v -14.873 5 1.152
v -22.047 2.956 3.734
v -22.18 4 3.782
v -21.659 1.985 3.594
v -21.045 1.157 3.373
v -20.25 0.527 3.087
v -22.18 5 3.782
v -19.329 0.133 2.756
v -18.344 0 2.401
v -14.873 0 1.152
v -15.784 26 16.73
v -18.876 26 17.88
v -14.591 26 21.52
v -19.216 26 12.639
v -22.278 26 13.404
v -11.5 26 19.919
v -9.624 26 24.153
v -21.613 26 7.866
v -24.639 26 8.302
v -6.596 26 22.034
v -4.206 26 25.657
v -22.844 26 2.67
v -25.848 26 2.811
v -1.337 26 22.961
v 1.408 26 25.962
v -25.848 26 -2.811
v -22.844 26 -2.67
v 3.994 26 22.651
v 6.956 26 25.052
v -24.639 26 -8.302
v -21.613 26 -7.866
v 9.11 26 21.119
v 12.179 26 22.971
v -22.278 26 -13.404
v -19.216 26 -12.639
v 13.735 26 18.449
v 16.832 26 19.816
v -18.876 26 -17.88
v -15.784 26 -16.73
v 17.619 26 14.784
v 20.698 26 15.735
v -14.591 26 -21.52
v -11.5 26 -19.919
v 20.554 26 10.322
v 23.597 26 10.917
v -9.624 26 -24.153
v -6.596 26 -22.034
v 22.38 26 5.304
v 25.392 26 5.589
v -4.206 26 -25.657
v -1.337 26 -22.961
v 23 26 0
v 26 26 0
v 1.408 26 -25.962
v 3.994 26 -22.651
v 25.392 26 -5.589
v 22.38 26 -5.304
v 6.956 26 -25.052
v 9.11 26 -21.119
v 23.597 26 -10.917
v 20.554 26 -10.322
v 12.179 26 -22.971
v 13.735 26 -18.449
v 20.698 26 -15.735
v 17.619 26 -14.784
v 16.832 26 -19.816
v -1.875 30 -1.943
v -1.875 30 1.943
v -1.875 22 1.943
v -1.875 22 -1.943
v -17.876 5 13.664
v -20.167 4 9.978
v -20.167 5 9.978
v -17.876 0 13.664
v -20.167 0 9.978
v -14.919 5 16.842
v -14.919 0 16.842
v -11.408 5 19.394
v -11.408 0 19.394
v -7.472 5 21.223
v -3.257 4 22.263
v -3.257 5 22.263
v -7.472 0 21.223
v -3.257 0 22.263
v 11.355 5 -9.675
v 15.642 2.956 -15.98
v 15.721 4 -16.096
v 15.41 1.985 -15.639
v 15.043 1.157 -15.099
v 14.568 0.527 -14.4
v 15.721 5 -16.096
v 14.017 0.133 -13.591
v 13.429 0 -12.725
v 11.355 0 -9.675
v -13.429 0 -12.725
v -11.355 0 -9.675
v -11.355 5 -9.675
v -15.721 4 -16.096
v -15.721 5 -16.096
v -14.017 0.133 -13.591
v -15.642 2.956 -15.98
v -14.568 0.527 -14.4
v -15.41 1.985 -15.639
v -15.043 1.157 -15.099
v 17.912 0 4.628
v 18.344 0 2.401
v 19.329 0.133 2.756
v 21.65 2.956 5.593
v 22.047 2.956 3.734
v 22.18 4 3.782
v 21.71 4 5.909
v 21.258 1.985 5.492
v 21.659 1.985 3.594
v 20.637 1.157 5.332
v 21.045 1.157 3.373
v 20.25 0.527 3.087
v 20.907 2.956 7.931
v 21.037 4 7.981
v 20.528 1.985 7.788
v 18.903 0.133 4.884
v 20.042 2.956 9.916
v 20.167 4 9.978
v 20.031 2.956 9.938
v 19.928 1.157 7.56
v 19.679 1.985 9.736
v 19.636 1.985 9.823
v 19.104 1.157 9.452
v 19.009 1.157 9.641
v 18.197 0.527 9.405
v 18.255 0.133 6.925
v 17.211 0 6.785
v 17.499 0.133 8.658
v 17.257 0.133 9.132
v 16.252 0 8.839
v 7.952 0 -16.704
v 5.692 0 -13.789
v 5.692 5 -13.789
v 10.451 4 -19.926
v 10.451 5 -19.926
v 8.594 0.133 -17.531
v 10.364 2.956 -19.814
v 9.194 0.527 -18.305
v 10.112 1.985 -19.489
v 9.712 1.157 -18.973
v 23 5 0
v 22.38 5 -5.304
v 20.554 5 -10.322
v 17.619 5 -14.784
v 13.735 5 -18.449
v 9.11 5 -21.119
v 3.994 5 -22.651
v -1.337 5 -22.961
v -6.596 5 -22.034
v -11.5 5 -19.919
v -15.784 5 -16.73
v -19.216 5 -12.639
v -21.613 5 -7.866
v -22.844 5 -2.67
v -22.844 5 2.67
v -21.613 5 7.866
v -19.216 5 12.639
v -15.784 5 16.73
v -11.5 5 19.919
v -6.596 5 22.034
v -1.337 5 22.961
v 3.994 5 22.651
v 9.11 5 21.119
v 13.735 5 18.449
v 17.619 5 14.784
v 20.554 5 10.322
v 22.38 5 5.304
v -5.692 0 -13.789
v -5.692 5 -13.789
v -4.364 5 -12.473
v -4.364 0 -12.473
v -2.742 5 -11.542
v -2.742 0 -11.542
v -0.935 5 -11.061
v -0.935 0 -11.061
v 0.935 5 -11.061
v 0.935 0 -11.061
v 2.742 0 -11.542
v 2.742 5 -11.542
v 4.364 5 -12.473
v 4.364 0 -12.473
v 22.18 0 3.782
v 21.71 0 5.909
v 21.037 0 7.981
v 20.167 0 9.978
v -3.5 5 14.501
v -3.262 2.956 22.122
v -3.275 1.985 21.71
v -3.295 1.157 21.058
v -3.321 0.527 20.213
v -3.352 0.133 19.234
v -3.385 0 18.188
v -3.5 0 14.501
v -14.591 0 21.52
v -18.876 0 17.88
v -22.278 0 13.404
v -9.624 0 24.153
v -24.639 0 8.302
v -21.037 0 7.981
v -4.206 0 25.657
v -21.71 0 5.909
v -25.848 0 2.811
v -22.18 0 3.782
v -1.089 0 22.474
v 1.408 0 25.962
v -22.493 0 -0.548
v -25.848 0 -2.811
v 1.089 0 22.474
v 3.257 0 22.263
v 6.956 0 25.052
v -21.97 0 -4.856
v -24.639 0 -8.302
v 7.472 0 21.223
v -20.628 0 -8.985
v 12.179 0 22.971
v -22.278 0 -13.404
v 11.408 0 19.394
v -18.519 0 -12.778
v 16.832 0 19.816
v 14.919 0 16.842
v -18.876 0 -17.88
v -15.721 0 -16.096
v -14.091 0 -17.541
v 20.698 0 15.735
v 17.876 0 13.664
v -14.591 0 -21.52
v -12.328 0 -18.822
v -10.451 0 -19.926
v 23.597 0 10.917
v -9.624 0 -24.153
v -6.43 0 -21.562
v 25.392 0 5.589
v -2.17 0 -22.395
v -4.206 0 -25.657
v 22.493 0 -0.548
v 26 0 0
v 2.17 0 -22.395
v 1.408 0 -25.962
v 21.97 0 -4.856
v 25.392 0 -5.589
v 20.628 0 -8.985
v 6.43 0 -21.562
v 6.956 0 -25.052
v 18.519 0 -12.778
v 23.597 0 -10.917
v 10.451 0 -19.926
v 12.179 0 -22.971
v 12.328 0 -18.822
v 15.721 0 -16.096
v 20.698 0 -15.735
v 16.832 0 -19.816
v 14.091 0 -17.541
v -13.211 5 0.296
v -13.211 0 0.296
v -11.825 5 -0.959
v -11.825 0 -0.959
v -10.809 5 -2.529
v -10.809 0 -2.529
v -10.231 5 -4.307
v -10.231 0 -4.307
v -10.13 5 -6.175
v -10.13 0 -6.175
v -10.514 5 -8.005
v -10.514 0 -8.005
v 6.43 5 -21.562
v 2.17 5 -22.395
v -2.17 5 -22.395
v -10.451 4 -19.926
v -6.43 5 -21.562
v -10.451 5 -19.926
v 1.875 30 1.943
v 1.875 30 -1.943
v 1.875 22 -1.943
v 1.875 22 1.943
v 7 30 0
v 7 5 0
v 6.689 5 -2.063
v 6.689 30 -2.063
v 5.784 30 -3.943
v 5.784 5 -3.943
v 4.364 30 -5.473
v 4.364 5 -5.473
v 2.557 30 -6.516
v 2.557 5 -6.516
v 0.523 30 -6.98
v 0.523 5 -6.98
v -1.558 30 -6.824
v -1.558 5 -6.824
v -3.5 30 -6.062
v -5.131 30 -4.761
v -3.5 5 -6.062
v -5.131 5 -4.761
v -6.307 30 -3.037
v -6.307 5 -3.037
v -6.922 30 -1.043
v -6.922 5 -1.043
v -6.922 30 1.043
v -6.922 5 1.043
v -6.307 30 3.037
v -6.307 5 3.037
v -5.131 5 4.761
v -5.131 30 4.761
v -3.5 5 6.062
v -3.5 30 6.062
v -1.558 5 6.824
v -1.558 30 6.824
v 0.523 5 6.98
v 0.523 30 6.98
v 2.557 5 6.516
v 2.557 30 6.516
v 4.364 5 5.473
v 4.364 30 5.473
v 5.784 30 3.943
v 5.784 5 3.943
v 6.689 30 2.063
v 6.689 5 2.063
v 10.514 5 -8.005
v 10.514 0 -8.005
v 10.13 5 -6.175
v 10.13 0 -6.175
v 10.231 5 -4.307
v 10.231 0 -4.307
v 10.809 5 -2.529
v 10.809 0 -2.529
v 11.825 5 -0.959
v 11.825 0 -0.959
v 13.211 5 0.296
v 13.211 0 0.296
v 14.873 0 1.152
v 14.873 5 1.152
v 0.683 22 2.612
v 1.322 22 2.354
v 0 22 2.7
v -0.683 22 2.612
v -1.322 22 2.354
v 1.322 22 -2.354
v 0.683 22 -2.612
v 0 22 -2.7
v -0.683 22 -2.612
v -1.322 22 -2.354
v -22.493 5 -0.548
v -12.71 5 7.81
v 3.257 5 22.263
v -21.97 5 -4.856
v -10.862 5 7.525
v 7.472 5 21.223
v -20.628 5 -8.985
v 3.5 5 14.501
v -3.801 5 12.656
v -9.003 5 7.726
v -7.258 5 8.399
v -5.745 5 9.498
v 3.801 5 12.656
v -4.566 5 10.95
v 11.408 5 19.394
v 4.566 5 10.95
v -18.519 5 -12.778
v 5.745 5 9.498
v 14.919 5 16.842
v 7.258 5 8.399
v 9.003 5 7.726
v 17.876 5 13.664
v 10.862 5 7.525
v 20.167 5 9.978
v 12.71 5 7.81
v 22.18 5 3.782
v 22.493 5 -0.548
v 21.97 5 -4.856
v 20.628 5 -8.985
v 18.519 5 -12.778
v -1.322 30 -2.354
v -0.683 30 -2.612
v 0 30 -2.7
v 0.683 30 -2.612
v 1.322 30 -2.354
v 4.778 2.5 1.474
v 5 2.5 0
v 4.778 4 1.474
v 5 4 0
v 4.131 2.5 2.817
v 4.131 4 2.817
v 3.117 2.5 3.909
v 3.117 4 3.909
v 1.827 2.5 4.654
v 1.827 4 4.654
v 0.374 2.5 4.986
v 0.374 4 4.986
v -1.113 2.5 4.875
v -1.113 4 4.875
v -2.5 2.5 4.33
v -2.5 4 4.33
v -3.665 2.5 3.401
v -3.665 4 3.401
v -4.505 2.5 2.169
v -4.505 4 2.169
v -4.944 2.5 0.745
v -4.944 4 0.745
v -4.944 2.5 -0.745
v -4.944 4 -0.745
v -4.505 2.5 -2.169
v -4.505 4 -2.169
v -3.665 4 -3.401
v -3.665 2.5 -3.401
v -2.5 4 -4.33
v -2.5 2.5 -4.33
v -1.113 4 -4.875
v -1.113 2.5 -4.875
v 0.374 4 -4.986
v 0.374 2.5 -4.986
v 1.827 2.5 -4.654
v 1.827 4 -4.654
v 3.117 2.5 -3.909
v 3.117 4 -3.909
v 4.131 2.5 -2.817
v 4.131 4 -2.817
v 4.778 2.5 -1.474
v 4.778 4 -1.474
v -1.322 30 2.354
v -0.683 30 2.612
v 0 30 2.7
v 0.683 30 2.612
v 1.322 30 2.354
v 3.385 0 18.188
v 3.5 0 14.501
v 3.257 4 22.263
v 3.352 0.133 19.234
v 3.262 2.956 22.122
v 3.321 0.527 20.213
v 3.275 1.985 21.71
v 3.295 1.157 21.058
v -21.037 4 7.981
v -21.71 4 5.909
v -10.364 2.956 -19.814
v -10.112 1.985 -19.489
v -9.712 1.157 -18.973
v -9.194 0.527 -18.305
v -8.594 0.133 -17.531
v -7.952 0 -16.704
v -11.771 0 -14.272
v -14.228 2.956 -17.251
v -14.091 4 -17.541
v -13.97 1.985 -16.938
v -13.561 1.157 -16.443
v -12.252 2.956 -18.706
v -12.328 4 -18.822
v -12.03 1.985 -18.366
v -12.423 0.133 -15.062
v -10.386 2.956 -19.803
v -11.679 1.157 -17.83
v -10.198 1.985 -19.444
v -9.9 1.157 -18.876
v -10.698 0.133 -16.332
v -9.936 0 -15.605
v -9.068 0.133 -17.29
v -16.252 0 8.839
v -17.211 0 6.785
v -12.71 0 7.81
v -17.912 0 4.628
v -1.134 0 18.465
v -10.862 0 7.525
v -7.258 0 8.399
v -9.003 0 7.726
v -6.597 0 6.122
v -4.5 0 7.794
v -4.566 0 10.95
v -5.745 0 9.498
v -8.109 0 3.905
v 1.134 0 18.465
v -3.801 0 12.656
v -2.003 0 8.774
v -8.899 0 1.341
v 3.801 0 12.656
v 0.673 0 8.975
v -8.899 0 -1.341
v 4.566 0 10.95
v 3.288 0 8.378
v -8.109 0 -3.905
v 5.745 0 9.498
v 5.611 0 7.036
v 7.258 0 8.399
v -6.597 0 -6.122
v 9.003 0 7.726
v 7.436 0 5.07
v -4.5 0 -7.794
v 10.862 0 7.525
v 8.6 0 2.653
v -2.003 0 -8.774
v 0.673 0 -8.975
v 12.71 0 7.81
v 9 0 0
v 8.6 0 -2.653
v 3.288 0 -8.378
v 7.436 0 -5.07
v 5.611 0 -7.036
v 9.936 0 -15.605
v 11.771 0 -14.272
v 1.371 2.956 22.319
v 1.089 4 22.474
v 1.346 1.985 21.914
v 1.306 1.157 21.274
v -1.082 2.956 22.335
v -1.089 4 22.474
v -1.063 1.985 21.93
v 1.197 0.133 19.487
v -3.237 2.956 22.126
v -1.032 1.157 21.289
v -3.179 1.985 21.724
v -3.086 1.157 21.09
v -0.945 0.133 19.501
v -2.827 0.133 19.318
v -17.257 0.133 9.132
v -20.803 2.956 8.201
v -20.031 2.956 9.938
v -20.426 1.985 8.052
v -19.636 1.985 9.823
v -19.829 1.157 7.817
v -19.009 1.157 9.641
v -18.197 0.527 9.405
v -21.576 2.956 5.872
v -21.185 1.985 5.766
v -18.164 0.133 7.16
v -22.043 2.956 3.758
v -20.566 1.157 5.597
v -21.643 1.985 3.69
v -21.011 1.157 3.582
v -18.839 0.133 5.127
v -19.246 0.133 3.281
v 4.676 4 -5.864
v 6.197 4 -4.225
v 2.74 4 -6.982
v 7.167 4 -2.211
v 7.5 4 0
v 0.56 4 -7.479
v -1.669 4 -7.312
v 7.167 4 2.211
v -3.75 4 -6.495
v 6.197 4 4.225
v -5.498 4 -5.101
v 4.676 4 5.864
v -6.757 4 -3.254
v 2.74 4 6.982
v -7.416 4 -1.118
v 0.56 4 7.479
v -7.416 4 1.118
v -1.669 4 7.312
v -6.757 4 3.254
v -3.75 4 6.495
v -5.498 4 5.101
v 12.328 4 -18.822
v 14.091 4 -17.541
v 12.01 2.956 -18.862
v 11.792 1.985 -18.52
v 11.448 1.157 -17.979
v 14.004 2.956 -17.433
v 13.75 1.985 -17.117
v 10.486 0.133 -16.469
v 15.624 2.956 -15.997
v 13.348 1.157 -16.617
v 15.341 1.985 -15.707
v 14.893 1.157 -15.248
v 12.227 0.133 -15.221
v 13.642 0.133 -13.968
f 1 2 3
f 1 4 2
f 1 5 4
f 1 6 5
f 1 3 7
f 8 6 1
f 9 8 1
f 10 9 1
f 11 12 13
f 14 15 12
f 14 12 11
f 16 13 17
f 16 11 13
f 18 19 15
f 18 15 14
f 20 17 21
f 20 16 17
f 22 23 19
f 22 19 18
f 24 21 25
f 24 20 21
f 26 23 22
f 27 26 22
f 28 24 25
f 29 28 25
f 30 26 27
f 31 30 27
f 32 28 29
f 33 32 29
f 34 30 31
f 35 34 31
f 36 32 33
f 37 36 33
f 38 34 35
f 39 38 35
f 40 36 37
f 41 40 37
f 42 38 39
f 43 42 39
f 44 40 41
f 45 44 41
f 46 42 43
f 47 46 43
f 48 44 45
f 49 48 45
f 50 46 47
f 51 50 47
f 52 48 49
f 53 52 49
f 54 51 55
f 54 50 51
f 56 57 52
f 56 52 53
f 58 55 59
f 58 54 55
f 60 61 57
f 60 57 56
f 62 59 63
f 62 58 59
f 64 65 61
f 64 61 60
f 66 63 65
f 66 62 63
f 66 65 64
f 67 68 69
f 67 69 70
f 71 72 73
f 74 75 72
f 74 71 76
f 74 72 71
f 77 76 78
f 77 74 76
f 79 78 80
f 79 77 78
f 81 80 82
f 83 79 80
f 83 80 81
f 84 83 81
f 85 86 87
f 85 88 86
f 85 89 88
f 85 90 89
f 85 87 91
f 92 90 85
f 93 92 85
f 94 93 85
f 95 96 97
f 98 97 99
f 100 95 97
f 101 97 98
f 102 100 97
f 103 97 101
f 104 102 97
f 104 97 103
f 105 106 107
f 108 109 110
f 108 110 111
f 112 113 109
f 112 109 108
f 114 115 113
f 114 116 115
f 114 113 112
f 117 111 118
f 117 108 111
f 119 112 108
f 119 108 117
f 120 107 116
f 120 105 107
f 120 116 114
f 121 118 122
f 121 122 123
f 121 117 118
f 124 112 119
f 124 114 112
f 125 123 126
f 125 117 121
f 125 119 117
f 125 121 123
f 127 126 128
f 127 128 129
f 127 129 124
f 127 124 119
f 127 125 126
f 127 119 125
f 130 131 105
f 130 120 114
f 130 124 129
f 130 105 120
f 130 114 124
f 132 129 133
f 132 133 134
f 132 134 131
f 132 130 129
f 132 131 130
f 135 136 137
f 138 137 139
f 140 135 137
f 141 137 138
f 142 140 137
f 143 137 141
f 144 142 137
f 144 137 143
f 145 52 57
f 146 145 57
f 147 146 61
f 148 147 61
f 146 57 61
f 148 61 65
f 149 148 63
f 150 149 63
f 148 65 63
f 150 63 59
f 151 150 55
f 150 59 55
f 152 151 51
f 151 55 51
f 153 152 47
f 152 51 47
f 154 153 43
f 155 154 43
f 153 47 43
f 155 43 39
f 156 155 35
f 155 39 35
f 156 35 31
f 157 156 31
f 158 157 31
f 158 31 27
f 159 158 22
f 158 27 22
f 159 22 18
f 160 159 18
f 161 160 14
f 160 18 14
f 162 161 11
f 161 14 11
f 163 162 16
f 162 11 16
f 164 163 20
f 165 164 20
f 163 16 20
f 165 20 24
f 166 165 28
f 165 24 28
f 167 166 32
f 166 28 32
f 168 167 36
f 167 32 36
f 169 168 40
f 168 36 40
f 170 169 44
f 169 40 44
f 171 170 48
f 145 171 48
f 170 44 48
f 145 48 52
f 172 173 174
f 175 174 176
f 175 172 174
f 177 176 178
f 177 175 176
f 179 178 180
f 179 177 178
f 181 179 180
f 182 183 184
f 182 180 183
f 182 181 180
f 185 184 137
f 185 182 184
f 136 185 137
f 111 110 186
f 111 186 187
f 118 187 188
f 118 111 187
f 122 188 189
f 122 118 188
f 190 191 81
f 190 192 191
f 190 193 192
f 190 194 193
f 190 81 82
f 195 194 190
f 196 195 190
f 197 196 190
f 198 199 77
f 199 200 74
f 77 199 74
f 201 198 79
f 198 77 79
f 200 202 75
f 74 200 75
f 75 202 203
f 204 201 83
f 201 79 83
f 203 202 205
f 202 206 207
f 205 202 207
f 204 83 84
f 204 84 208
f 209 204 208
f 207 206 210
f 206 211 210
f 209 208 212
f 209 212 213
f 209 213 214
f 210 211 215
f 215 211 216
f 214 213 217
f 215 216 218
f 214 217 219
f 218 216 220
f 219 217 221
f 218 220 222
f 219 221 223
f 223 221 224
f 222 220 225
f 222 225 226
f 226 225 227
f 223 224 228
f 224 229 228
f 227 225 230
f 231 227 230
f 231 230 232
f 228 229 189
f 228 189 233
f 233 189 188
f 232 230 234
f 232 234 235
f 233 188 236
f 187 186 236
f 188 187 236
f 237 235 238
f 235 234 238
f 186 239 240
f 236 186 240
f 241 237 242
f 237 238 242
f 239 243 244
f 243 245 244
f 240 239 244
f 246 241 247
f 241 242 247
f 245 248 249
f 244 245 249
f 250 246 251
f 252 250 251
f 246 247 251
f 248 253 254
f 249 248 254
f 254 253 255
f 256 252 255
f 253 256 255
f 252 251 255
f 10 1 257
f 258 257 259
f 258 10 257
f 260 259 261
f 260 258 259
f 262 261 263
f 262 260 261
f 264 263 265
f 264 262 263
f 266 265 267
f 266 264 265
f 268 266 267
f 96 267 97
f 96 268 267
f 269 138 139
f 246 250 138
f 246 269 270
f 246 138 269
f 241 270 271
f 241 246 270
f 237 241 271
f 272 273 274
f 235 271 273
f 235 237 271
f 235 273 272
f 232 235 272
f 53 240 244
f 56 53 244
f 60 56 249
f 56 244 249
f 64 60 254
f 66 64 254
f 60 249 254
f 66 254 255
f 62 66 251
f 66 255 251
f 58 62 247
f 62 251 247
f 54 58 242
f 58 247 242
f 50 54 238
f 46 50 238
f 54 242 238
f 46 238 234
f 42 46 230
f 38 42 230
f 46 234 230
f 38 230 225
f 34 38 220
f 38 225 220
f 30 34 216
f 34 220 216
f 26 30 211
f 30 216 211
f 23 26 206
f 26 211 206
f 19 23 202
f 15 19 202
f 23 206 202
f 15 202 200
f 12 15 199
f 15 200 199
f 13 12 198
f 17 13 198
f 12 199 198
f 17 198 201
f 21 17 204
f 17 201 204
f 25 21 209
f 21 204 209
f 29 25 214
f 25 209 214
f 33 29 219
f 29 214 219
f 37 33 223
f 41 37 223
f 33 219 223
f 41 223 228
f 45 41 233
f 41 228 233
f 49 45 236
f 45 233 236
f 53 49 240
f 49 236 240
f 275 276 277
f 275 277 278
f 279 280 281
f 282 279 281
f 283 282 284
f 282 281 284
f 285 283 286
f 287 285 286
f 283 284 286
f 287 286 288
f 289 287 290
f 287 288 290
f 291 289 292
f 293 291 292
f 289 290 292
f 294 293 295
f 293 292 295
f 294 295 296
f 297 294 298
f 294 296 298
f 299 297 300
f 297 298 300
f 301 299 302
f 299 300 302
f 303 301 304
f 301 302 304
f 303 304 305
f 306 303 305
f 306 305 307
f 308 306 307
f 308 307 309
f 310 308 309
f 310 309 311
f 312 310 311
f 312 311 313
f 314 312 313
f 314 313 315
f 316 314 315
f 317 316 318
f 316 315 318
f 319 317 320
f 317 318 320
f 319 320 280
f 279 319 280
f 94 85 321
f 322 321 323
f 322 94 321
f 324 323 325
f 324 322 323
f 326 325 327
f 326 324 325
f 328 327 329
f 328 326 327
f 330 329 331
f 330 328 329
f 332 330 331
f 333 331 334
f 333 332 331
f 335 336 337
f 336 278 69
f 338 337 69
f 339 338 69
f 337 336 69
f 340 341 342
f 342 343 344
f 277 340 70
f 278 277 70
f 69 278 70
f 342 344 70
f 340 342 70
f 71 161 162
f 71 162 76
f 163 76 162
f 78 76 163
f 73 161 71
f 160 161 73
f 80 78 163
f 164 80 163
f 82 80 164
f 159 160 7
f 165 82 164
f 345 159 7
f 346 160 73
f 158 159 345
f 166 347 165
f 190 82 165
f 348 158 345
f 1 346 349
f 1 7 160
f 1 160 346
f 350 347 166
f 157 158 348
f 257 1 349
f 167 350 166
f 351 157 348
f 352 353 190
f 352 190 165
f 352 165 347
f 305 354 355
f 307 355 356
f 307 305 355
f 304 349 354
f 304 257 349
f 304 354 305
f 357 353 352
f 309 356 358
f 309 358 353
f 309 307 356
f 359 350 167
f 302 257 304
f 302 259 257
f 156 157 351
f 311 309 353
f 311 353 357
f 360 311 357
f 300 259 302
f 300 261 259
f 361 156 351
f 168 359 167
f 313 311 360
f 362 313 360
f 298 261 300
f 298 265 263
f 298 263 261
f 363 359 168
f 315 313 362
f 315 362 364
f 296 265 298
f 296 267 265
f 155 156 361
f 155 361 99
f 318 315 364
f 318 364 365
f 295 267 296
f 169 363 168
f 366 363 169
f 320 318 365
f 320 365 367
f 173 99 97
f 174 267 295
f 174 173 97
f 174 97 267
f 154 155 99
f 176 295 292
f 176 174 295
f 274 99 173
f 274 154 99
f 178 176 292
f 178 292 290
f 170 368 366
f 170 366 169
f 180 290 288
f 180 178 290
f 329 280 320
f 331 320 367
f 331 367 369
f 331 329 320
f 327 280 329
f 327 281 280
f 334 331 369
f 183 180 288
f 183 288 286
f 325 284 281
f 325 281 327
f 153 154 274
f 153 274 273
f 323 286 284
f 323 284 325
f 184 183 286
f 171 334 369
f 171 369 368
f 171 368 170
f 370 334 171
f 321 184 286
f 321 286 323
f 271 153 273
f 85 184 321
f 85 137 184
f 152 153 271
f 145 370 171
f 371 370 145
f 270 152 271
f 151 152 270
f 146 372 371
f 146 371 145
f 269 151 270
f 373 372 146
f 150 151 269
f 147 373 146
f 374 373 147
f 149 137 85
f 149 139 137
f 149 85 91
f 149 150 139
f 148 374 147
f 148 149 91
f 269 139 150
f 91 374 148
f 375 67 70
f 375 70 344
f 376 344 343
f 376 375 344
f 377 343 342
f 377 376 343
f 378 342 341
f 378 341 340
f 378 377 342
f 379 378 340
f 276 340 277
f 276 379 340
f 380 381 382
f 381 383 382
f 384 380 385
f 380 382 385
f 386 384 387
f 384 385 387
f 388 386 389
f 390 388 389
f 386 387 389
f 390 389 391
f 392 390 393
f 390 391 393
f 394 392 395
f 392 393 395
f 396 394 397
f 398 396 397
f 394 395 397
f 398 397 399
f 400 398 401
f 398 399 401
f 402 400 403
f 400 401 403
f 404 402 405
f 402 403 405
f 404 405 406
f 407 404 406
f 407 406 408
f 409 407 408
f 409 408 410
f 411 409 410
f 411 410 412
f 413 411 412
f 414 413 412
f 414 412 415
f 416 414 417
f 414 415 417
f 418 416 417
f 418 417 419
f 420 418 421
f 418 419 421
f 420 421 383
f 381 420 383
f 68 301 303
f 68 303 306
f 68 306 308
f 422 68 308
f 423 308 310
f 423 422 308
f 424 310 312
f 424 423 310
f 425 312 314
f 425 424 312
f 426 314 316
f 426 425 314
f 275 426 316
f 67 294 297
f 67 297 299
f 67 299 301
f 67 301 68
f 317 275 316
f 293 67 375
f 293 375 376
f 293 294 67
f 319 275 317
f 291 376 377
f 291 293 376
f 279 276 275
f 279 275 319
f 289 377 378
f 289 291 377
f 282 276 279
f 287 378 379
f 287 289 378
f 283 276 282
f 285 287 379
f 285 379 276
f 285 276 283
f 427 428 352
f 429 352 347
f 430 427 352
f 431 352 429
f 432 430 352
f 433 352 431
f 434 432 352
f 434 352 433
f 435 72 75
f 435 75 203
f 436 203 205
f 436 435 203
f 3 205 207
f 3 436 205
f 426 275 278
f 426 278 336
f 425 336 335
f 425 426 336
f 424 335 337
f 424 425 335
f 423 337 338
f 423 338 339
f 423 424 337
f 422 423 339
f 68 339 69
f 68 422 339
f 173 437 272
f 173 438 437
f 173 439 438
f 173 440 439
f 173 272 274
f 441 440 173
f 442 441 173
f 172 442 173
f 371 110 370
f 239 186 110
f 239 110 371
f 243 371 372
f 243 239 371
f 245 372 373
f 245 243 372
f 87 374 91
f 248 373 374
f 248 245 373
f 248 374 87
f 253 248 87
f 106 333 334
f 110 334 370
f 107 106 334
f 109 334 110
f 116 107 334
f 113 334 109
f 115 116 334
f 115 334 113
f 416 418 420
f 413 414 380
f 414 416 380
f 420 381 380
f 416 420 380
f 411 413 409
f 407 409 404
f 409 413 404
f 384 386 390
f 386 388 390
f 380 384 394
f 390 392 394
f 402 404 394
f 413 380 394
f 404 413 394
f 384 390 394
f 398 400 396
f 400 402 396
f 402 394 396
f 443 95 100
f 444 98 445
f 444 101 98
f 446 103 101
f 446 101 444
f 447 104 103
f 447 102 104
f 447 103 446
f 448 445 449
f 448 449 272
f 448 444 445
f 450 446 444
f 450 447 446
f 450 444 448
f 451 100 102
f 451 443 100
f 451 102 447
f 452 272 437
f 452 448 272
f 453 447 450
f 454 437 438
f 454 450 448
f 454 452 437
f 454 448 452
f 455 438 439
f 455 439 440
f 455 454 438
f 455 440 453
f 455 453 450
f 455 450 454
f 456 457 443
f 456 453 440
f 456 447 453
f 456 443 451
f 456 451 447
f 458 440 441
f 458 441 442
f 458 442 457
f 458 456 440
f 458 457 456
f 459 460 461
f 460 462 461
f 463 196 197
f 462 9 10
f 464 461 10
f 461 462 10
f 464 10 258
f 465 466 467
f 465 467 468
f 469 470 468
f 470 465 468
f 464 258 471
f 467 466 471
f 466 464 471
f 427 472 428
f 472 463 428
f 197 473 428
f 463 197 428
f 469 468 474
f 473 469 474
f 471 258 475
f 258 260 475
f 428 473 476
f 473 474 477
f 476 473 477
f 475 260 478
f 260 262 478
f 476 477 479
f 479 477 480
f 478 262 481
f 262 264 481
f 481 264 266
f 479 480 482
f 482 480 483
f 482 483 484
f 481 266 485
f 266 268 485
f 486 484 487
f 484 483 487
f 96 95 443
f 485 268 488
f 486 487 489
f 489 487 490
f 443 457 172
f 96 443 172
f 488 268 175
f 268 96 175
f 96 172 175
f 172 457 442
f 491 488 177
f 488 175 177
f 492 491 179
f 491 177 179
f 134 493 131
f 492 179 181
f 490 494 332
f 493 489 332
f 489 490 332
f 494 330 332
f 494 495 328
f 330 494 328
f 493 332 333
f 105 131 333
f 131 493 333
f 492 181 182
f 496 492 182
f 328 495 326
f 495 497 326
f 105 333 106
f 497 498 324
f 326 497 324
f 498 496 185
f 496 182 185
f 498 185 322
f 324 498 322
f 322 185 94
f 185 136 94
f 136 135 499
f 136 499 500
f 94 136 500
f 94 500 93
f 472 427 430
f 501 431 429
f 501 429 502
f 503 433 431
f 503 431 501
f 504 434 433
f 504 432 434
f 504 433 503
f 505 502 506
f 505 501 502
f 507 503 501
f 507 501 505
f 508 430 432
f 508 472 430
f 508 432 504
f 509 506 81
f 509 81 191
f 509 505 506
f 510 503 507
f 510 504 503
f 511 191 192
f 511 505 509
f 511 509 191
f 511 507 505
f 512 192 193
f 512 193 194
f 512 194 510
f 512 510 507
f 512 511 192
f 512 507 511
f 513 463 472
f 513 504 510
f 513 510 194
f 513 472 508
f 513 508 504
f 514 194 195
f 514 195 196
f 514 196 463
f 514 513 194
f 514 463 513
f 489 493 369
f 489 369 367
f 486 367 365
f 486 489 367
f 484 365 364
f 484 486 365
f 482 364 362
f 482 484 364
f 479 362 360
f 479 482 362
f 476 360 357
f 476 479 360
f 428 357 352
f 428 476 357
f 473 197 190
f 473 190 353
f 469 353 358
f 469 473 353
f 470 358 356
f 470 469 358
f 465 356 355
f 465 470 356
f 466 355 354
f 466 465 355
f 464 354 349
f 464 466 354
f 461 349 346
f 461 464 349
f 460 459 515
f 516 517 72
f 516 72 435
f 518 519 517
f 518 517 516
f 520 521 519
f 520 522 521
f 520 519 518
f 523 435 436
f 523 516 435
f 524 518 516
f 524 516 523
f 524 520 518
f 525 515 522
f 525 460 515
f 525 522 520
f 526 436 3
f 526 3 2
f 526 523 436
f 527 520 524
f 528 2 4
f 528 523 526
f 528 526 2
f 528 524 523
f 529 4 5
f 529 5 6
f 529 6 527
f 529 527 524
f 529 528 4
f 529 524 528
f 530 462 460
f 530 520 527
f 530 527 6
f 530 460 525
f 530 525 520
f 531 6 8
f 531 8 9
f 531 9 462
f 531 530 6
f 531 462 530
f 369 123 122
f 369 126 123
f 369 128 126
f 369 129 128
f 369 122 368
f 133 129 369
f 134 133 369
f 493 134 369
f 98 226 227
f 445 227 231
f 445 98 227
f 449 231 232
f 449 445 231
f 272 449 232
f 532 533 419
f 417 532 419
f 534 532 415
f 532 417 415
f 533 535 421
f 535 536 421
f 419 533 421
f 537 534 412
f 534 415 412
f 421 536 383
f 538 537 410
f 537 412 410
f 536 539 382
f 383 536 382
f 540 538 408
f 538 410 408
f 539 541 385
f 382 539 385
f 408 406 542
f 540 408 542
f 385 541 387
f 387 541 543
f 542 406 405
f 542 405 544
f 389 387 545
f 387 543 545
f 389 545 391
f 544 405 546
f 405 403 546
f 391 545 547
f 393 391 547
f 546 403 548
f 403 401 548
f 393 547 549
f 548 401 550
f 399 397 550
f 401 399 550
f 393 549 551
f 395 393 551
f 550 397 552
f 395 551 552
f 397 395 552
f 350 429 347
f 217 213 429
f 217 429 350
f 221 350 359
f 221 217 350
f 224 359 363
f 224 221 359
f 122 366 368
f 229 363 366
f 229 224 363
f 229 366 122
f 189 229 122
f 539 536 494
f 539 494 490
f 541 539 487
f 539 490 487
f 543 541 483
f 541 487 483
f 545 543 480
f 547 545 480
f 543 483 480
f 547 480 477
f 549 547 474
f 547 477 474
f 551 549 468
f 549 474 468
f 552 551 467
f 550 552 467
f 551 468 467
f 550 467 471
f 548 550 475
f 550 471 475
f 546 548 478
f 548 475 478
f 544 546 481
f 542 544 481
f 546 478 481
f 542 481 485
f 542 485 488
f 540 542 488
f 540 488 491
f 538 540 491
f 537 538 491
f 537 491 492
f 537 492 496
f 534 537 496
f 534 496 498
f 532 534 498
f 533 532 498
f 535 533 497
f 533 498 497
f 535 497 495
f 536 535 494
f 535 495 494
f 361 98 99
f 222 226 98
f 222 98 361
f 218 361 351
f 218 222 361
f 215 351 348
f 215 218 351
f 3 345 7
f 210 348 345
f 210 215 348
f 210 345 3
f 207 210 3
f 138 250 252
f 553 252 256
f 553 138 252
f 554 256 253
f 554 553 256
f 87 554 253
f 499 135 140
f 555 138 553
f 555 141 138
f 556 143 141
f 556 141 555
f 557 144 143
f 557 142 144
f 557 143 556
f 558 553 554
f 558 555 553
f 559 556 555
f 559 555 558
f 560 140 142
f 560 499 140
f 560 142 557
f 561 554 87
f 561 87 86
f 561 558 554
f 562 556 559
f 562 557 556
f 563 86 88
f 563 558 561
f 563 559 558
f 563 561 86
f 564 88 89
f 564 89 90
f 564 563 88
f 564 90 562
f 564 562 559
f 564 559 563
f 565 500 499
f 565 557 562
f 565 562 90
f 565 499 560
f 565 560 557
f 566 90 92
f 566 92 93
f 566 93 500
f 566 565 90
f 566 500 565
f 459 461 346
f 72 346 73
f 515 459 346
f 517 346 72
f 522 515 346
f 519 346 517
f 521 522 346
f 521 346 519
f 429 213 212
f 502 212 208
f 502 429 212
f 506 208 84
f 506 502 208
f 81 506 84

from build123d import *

# Parameters (mm, degrees)
SKETCH1_R           = 26
BOSS_EXTRUDE1_DEPTH = 26
SKETCH2_R           = 23
CUT_EXTRUDE1_DEPTH  = 21
CUT_EXTRUDE2_DEPTH  = 21
SKETCH6_R           = 7
BOSS_EXTRUDE2_DEPTH = 25
CUT_EXTRUDE3_DEPTH  = 8


with BuildPart() as part:
    # Sketch1 → Boss-Extrude1 (new body)
    with BuildSketch(Plane(origin=(0, 0, 0), x_dir=(1, 0, 0), z_dir=(0, 1, 0))):
        Circle(SKETCH1_R)
    extrude(amount=BOSS_EXTRUDE1_DEPTH)

    # Sketch2 → Cut-Extrude1 (cut)
    with BuildSketch(Plane(origin=(0, 26, 0), x_dir=(1, 0, 0), z_dir=(0, 1, 0))):
        Circle(SKETCH2_R)
    extrude(amount=-CUT_EXTRUDE1_DEPTH, mode=Mode.SUBTRACT)

    # Sketch3 → Cut-Extrude2 (cut)
    with BuildSketch(Plane.XZ):
        with BuildLine():
            Line((-3.257409457, 22.262957657), (-3.50001968, 14.501403797))
            ThreePointArc((-3.50001968, 14.501403797), (-6.465637776, 8.899186938), (-12.710089015, 7.809896739))
            Line((-12.710089015, 7.809896739), (-20.166736072, 9.977612751))
            ThreePointArc((-20.166736072, 9.977612751), (-13.225168177, 18.202882373), (-3.257409457, 22.262957657))
        make_face()
        with BuildLine():
            Line((20.166736072, 9.977612751), (12.710089014, 7.809896739))
            ThreePointArc((12.710089014, 7.809896739), (6.465637775, 8.899186939), (3.50001968, 14.501403797))
            Line((3.50001968, 14.501403797), (3.257409457, 22.262957657))
            ThreePointArc((3.257409457, 22.262957657), (13.225168177, 18.202882373), (20.166736072, 9.977612751))
        make_face()
        with BuildLine():
            Line((15.721137791, -16.09645385), (11.355286691, -9.674622163))
            ThreePointArc((11.355286691, -9.674622163), (10.46162168, -3.399186938), (14.873220138, 1.152463692))
            Line((14.873220138, 1.152463692), (22.179925831, 3.781651771))
            ThreePointArc((22.179925831, 3.781651771), (21.398771617, -6.952882373), (15.721137791, -16.09645385))
        make_face()
        with BuildLine():
            Line((-10.450538575, -19.925768329), (-5.692135888, -13.789142064))
            ThreePointArc((-5.692135888, -13.789142064), (0, -11), (5.692135888, -13.789142064))
            Line((5.692135888, -13.789142064), (10.450538575, -19.925768329))
            ThreePointArc((10.450538575, -19.925768329), (0, -22.5), (-10.450538575, -19.925768329))
        make_face()
        with BuildLine():
            Line((-22.179925831, 3.781651771), (-14.873220138, 1.152463692))
            ThreePointArc((-14.873220138, 1.152463692), (-10.46162168, -3.399186938), (-11.355286691, -9.674622163))
            Line((-11.355286691, -9.674622163), (-15.721137791, -16.09645385))
            ThreePointArc((-15.721137791, -16.09645385), (-21.398771617, -6.952882373), (-22.179925831, 3.781651771))
        make_face()
    extrude(amount=-CUT_EXTRUDE2_DEPTH, mode=Mode.SUBTRACT)

    # Sketch5 → Cut-Revolve1 (revolve, cut)
    with BuildSketch(Plane.XY):
        with BuildLine():
            Line((18.5, 0), (22.5, 0))
            Line((22.5, 0), (22.5, 4))
            ThreePointArc((22.5, 4), (21.328427125, 1.171572875), (18.5, 0))
        make_face()
        Polygon((0, 0), (0, 2.5), (5, 2.5), (5, 4), (7.5, 4), (9, 0), align=None)
    revolve(axis=Axis((0, 26, 0), (0, -1, 0)), mode=Mode.SUBTRACT)

    # Sketch6 → Boss-Extrude2 (add)
    with BuildSketch(Plane(origin=(0, 5, 0), x_dir=(1, 0, 0), z_dir=(0, 1, 0))):
        Circle(SKETCH6_R)
    extrude(amount=BOSS_EXTRUDE2_DEPTH)

    # Sketch7 → Cut-Extrude3 (cut)
    with BuildSketch(Plane(origin=(0, 30, 0), x_dir=(1, 0, 0), z_dir=(0, 1, 0))):
        with BuildLine():
            Line((-1.875, 0), (-1.875, 1.942775077))
            ThreePointArc((-1.875, 1.942775077), (0, 2.7), (1.875, 1.942775077))
            Line((1.875, 1.942775077), (1.875, 0))
            Line((1.875, 0), (1.875, -1.942775077))
            ThreePointArc((1.875, -1.942775077), (0, -2.7), (-1.875, -1.942775077))
            Line((-1.875, -1.942775077), (-1.875, 0))
        make_face()
    extrude(amount=-CUT_EXTRUDE3_DEPTH, mode=Mode.SUBTRACT)


solid = part.part
